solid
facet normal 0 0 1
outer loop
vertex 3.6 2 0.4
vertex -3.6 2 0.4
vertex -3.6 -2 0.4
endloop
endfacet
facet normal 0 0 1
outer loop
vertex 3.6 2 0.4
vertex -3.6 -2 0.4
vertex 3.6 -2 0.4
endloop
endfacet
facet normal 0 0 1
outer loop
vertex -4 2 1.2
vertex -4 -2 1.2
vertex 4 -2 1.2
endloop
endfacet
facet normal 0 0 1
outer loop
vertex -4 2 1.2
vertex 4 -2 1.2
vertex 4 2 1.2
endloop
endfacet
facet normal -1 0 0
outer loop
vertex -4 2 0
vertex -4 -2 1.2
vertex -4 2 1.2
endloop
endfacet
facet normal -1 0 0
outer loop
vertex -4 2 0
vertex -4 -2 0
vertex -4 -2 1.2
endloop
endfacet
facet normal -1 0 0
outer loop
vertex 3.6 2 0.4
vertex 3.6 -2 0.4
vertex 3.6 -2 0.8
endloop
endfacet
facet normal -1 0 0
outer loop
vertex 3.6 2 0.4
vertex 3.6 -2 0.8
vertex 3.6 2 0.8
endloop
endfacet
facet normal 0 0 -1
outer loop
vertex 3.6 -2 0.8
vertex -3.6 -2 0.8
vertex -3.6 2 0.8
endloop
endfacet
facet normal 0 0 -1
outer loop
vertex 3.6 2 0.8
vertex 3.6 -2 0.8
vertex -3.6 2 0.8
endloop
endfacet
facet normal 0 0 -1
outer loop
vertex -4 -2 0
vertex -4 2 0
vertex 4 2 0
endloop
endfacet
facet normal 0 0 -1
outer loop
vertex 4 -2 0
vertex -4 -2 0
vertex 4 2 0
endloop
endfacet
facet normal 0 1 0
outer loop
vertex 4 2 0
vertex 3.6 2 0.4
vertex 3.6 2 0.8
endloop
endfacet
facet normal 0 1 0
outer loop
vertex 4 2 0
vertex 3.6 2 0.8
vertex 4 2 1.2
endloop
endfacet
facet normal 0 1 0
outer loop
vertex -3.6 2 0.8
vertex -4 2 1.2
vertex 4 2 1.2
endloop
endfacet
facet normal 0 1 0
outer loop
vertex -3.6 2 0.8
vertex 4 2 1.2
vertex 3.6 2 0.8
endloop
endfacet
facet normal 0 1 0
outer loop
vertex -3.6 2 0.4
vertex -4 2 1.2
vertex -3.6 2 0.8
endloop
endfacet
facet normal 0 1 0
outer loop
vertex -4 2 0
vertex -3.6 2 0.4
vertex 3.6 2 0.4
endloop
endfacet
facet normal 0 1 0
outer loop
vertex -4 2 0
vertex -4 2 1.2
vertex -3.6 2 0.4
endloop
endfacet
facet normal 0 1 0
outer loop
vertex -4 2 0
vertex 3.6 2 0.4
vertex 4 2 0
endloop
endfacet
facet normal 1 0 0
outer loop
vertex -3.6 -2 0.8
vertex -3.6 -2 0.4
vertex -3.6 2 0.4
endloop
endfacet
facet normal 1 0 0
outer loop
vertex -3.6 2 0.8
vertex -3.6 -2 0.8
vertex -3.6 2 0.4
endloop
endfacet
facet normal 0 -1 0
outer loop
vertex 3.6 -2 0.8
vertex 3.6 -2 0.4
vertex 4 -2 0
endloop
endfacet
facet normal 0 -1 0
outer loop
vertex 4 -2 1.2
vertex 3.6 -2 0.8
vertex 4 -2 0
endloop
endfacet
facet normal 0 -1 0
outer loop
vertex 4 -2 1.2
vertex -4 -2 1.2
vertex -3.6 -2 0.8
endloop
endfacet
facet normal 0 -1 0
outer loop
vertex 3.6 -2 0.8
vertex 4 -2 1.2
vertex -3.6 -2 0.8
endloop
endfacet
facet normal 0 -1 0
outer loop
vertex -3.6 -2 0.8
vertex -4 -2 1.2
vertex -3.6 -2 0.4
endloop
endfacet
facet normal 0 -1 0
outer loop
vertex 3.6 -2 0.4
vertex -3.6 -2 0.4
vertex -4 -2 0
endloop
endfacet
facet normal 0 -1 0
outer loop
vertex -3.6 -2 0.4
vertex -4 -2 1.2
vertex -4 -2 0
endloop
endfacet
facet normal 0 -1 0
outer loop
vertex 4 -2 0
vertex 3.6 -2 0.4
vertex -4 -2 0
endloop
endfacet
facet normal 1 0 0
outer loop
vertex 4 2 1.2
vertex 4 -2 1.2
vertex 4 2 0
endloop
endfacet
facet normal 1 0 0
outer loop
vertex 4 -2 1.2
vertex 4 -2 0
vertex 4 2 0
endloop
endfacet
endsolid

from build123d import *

# Parameters (mm, degrees)
SKETCH2_W           = 8
SKETCH2_H           = 4
BOSS_EXTRUDE1_DEPTH = 0.4
SKETCH3_W           = 0.4
SKETCH3_H           = 4
BOSS_EXTRUDE2_DEPTH = 0.8
SKETCH4_W           = 0.4
SKETCH4_H           = 4
BOSS_EXTRUDE3_DEPTH = 0.8
BOSS_EXTRUDE4_REACH = 9.6
SKETCH5_W           = 0.4
SKETCH5_H           = 4


with BuildPart() as part:
    # Sketch2 → Boss-Extrude1 (new body)
    with BuildSketch(Plane.XY):
        Rectangle(SKETCH2_W, SKETCH2_H)
    extrude(amount=BOSS_EXTRUDE1_DEPTH)

    # Sketch3 → Boss-Extrude2 (add)
    with BuildSketch(Plane.XY.offset(0.4)):
        with Locations((-3.8, 0)):
            Rectangle(SKETCH3_W, SKETCH3_H)
    extrude(amount=BOSS_EXTRUDE2_DEPTH)

    # Sketch4 → Boss-Extrude3 (add)
    with BuildSketch(Plane.XY.offset(0.4)):
        with Locations((3.8, 0)):
            Rectangle(SKETCH4_W, SKETCH4_H)
    extrude(amount=BOSS_EXTRUDE3_DEPTH)

    # Sketch5 → Boss-Extrude4 (add, up to next)
    with BuildSketch(Plane(origin=(-3.6, 0, 0), x_dir=(0, 0, -1), z_dir=(1, 0, 0)), mode=Mode.PRIVATE) as boss_extrude4_sk1:
        with Locations((-1, 0)):
            Rectangle(SKETCH5_W, SKETCH5_H)
    boss_extrude4_tool1 = extrude(boss_extrude4_sk1.sketch, amount=BOSS_EXTRUDE4_REACH, mode=Mode.PRIVATE) - part.part
    add(boss_extrude4_tool1.solids().sort_by_distance((-3.6, 0, 1))[0])


solid = part.part
